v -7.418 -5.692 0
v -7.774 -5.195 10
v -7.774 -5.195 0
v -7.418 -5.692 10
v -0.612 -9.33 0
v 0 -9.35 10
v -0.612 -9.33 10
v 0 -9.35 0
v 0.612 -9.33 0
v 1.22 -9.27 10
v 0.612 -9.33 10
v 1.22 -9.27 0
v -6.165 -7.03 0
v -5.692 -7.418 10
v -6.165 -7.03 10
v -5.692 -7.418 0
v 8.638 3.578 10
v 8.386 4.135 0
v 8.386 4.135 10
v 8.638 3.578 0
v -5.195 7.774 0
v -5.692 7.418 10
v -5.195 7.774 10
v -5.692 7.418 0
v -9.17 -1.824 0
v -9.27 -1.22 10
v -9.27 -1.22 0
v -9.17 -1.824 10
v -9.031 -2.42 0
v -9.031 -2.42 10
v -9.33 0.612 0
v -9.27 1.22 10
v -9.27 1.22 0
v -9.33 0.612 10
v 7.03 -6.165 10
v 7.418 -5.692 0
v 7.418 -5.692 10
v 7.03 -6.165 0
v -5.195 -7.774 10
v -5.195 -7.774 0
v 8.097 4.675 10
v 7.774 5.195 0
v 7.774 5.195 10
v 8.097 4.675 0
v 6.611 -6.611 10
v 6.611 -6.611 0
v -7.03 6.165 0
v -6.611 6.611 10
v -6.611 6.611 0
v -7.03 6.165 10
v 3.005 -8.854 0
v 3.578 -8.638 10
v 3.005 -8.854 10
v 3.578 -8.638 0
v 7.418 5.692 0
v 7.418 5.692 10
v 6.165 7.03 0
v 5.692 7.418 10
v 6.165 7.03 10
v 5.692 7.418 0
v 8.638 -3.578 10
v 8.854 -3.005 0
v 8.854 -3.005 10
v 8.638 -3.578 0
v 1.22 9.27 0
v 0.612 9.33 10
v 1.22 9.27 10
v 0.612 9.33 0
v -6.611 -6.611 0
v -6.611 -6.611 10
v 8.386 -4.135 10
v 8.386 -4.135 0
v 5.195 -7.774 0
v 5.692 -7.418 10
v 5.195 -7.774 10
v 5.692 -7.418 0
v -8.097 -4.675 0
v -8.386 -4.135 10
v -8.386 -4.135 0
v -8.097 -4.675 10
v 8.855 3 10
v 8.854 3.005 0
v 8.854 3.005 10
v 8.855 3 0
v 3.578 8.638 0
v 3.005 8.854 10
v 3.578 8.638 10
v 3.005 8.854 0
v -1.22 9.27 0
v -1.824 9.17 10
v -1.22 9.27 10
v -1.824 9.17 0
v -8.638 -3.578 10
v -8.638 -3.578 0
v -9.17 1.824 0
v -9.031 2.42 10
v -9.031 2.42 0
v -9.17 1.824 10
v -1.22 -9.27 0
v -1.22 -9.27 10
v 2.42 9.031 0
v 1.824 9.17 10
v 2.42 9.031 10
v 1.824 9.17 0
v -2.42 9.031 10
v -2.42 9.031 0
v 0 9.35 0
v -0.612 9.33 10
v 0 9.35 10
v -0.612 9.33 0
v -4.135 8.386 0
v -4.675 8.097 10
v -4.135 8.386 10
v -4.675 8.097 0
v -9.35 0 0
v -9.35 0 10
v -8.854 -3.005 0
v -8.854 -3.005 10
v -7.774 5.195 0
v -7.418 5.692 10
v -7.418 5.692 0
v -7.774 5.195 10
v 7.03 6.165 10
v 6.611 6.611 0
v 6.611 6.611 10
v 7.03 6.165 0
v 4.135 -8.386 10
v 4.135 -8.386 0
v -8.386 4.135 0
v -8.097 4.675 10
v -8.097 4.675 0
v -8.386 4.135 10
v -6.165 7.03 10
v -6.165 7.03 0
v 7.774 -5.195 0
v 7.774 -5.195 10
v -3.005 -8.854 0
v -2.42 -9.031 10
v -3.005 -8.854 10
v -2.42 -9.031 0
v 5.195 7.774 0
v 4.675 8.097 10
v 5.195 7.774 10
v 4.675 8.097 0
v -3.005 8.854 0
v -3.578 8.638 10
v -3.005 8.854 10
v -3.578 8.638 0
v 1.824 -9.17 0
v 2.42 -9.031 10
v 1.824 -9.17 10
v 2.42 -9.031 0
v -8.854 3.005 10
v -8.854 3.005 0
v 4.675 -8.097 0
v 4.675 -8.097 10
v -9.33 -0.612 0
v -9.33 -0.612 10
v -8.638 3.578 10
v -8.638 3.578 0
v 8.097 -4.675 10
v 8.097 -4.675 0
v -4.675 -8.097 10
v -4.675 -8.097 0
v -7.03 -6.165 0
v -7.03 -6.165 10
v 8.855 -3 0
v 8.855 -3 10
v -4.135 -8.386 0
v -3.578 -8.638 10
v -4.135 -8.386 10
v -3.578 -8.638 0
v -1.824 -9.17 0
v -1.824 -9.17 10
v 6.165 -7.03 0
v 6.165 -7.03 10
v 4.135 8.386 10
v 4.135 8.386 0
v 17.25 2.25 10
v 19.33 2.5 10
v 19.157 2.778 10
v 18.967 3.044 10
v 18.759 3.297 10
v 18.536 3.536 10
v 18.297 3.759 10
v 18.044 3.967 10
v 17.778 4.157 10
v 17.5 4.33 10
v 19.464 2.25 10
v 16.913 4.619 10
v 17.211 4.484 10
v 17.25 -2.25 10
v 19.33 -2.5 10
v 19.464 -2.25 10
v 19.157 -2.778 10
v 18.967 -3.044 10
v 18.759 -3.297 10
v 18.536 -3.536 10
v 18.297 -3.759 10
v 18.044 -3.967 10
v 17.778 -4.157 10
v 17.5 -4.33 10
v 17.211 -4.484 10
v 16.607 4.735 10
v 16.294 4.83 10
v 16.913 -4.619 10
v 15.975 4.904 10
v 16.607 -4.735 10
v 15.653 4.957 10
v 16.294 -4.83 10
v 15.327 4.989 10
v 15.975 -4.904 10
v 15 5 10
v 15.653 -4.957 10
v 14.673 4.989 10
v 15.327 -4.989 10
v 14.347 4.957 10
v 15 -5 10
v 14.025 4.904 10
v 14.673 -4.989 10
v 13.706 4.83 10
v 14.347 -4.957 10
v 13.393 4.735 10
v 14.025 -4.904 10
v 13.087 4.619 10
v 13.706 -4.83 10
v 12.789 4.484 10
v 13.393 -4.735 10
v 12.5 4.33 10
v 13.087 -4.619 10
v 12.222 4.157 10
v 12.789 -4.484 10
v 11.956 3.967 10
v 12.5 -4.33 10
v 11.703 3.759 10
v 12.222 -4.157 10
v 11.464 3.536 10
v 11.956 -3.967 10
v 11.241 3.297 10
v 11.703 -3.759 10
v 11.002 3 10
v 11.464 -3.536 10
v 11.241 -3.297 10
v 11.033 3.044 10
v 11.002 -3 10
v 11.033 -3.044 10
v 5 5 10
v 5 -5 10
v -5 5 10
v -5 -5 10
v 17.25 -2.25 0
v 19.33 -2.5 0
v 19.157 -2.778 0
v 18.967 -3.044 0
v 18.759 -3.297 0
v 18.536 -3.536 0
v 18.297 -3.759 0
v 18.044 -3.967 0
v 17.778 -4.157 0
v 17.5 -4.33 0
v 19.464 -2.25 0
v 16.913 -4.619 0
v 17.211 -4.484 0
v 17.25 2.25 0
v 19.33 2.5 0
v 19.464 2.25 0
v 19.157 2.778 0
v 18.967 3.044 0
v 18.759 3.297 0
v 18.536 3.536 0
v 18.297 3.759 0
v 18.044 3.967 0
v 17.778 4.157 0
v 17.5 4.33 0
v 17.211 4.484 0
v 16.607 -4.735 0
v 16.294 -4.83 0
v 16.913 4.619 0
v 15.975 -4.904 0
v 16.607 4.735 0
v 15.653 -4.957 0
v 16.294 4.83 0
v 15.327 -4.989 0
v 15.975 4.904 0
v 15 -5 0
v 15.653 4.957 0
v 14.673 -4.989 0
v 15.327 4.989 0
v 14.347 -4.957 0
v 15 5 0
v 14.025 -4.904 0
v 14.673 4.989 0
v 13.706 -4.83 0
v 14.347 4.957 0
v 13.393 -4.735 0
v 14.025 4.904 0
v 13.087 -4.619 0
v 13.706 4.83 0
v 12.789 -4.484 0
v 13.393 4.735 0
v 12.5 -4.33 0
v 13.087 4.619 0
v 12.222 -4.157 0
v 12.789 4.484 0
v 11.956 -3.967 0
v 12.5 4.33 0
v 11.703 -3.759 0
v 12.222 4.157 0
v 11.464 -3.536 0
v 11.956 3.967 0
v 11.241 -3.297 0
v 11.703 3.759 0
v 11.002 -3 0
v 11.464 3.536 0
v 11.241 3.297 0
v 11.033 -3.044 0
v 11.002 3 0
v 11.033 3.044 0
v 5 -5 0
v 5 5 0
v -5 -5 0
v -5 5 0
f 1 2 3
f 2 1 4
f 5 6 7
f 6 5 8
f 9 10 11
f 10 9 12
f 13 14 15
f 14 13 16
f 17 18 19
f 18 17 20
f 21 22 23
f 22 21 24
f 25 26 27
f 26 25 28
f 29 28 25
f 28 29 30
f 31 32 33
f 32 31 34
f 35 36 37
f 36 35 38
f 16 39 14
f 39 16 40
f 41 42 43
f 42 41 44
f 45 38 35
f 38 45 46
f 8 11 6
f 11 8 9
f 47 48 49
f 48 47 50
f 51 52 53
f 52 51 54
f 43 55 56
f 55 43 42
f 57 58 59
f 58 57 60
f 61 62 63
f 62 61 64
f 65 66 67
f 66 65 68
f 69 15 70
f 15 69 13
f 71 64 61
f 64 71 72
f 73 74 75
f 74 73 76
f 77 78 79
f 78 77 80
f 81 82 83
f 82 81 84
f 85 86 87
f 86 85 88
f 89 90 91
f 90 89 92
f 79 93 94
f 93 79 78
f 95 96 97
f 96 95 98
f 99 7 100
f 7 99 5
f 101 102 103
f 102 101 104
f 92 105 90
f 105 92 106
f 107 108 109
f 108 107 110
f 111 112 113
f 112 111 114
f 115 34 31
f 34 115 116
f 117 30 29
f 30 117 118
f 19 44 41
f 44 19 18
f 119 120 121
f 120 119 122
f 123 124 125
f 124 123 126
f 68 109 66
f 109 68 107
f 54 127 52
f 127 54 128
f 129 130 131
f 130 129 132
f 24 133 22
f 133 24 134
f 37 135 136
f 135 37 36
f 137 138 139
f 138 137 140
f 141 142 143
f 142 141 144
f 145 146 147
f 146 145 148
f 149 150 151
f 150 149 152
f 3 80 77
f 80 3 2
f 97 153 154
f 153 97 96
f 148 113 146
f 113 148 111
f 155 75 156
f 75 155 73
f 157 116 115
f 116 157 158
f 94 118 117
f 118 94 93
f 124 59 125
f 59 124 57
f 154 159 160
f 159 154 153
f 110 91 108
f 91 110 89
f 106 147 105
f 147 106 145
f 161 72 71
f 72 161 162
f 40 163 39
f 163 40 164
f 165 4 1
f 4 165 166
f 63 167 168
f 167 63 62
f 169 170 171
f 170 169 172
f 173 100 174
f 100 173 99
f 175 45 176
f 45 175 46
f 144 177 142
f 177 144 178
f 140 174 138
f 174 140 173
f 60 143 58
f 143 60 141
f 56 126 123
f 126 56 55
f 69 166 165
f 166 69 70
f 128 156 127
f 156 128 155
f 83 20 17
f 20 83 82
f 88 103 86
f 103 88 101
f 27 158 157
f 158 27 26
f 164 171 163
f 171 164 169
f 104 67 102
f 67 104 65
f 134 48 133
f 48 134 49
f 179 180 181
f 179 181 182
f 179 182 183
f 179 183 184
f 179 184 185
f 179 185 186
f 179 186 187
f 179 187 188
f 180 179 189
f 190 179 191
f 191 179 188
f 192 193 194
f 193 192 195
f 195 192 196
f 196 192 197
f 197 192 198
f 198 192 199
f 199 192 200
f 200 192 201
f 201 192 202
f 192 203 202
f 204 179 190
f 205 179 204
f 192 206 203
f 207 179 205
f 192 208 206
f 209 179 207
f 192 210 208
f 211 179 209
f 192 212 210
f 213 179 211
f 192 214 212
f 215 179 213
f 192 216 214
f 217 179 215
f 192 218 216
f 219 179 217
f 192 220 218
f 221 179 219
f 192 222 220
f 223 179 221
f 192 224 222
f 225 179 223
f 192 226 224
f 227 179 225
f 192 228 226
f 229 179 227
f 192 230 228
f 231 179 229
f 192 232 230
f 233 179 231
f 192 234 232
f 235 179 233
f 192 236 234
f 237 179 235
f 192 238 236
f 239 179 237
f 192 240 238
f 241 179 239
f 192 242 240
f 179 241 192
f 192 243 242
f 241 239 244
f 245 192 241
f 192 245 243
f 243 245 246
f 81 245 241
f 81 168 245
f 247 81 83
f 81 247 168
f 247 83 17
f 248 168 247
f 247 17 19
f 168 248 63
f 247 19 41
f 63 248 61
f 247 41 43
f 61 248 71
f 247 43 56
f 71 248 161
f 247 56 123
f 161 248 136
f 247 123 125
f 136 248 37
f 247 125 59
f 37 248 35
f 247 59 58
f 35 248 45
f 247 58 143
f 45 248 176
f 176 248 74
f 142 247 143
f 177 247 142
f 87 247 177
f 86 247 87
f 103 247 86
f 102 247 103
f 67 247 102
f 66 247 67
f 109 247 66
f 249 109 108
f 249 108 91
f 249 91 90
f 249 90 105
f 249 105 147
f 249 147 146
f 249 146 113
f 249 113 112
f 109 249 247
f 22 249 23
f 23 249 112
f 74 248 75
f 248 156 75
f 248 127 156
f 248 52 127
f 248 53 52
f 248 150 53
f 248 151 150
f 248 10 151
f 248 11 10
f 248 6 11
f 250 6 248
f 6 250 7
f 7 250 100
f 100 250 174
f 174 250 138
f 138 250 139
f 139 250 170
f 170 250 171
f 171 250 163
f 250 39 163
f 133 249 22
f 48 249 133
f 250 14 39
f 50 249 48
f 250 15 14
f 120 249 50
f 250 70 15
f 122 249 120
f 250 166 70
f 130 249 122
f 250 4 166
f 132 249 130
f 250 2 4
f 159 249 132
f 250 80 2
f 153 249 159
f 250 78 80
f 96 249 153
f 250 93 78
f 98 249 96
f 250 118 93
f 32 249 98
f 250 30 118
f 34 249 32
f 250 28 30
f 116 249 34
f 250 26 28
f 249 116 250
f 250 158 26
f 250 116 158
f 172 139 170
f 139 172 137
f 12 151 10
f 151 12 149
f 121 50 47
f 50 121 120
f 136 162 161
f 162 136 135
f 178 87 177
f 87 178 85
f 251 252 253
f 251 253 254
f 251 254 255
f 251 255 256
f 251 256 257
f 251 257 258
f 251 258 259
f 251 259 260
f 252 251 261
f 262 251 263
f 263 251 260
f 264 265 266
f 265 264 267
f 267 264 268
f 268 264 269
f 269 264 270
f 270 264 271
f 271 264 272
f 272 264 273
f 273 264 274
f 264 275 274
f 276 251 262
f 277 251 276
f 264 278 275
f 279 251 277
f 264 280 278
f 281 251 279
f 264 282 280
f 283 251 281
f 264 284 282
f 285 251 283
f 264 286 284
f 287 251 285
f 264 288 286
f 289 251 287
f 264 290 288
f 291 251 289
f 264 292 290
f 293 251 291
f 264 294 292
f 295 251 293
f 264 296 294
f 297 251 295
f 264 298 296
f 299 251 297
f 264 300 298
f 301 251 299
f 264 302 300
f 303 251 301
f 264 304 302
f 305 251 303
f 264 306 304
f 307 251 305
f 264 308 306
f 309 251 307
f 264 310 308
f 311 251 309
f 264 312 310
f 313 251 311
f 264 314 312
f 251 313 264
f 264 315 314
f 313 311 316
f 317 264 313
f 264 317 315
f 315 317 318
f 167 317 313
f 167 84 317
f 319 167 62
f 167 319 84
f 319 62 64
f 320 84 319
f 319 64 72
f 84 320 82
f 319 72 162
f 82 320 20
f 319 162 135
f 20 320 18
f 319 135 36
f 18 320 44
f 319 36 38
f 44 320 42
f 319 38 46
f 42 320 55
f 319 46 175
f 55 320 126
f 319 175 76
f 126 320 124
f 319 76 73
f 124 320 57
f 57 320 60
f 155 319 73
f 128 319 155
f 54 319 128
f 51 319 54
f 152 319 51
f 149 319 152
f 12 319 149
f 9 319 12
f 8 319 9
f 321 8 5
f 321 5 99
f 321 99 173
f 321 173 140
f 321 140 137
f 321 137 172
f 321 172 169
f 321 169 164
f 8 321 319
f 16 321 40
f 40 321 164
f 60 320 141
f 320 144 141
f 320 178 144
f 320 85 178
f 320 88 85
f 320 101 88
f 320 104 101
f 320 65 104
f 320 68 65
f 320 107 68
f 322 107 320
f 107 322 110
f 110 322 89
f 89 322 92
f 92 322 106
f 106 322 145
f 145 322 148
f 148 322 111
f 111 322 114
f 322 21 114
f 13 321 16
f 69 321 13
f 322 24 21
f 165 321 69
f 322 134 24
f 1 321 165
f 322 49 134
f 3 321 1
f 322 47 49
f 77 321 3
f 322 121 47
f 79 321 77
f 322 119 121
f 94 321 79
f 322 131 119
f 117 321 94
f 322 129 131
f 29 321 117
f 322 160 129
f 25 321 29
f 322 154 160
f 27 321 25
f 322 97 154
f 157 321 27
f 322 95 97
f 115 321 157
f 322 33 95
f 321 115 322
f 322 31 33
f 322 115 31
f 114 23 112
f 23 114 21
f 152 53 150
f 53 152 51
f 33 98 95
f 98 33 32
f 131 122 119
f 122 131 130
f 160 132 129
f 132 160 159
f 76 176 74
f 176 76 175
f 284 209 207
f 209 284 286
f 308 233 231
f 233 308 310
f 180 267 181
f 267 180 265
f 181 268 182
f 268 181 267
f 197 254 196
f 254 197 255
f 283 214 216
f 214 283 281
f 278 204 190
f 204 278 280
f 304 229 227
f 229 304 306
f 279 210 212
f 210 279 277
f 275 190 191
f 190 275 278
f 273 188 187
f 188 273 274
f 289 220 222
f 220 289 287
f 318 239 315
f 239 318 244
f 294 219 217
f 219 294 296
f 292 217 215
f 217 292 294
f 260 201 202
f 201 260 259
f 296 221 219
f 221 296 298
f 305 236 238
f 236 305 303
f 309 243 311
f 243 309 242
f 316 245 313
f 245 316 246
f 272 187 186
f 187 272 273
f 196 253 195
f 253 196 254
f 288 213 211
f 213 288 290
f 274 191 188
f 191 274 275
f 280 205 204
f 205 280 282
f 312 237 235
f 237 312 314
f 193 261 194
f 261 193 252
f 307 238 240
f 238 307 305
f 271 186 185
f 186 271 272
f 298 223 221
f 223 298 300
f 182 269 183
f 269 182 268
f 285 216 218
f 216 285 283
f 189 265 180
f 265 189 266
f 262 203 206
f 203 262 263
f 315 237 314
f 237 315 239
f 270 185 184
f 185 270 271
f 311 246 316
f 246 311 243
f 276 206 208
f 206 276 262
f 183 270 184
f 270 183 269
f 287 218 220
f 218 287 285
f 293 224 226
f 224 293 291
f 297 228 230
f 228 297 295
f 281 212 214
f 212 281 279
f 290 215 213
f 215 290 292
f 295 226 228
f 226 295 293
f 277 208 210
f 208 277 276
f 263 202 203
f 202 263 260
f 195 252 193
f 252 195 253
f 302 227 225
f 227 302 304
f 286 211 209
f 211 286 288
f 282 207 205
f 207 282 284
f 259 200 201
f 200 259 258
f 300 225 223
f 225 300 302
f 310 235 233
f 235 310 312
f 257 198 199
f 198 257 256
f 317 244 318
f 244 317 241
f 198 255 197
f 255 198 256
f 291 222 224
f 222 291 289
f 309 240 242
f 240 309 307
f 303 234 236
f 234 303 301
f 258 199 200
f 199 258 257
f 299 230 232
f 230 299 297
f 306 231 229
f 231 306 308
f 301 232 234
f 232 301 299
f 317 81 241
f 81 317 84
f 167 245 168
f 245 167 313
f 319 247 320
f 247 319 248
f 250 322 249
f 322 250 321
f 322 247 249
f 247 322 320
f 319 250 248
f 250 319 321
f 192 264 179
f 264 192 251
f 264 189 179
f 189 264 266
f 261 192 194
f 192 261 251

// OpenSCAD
// Snap-on tubing clip for a 12.7 mm lab stand rod
// Print orientation: flat on bed, extrusion builds up in +Z

// ---- Dimensions (mm) ----
rod_id     = 12.7;   // stand rod inner diameter
rod_wall   = 3;      // stand rod ring wall thickness
ring_od    = rod_id + 2 * rod_wall;   // stand rod ring outer diameter (18.7)

tub_id     = 6;      // tubing inner diameter
tub_wall   = 2;      // tubing ring wall thickness
tub_od     = tub_id + 2 * tub_wall;  // tubing ring outer diameter (10)
tub_x      = 15;     // tubing ring centre X position

bridge_w   = 6;      // solid bridge width along Y
bridge_x1  = 8;      // bridge start X
bridge_x2  = 12;     // bridge end X

opening_1  = 10;     // stand rod ring opening width (-X side)
opening_2  = 4.5;    // tubing ring opening width (+X side)

height     = 10;     // extrusion height in Z

// ---- Modelling helpers ----
eps        = 0.5;    // cutter overshoot past faces
$fn        = 96;     // circle resolution

// ---- 2-D profile in XY, extruded in Z ----
difference() {
    union() {
        // Stand rod ring
        cylinder(d = ring_od, h = height);
        // Tubing ring
        translate([tub_x, 0, 0])
            cylinder(d = tub_od, h = height);
        // Solid bridge between the rings
        translate([bridge_x1, -bridge_w / 2, 0])
            cube([bridge_x2 - bridge_x1, bridge_w, height]);
    }
    // Stand rod ring opening (x < 0, -5 < y < 5)
    translate([-opening_1 / 2, -opening_1 / 2, -eps])
        cube([opening_1, opening_1, height + 2 * eps]);
    // Tubing ring opening (x > 15, -2.25 < y < 2.25)
    translate([tub_x + opening_2 / 2, -opening_2 / 2, -eps])
        cube([opening_2, opening_2, height + 2 * eps]);
}
